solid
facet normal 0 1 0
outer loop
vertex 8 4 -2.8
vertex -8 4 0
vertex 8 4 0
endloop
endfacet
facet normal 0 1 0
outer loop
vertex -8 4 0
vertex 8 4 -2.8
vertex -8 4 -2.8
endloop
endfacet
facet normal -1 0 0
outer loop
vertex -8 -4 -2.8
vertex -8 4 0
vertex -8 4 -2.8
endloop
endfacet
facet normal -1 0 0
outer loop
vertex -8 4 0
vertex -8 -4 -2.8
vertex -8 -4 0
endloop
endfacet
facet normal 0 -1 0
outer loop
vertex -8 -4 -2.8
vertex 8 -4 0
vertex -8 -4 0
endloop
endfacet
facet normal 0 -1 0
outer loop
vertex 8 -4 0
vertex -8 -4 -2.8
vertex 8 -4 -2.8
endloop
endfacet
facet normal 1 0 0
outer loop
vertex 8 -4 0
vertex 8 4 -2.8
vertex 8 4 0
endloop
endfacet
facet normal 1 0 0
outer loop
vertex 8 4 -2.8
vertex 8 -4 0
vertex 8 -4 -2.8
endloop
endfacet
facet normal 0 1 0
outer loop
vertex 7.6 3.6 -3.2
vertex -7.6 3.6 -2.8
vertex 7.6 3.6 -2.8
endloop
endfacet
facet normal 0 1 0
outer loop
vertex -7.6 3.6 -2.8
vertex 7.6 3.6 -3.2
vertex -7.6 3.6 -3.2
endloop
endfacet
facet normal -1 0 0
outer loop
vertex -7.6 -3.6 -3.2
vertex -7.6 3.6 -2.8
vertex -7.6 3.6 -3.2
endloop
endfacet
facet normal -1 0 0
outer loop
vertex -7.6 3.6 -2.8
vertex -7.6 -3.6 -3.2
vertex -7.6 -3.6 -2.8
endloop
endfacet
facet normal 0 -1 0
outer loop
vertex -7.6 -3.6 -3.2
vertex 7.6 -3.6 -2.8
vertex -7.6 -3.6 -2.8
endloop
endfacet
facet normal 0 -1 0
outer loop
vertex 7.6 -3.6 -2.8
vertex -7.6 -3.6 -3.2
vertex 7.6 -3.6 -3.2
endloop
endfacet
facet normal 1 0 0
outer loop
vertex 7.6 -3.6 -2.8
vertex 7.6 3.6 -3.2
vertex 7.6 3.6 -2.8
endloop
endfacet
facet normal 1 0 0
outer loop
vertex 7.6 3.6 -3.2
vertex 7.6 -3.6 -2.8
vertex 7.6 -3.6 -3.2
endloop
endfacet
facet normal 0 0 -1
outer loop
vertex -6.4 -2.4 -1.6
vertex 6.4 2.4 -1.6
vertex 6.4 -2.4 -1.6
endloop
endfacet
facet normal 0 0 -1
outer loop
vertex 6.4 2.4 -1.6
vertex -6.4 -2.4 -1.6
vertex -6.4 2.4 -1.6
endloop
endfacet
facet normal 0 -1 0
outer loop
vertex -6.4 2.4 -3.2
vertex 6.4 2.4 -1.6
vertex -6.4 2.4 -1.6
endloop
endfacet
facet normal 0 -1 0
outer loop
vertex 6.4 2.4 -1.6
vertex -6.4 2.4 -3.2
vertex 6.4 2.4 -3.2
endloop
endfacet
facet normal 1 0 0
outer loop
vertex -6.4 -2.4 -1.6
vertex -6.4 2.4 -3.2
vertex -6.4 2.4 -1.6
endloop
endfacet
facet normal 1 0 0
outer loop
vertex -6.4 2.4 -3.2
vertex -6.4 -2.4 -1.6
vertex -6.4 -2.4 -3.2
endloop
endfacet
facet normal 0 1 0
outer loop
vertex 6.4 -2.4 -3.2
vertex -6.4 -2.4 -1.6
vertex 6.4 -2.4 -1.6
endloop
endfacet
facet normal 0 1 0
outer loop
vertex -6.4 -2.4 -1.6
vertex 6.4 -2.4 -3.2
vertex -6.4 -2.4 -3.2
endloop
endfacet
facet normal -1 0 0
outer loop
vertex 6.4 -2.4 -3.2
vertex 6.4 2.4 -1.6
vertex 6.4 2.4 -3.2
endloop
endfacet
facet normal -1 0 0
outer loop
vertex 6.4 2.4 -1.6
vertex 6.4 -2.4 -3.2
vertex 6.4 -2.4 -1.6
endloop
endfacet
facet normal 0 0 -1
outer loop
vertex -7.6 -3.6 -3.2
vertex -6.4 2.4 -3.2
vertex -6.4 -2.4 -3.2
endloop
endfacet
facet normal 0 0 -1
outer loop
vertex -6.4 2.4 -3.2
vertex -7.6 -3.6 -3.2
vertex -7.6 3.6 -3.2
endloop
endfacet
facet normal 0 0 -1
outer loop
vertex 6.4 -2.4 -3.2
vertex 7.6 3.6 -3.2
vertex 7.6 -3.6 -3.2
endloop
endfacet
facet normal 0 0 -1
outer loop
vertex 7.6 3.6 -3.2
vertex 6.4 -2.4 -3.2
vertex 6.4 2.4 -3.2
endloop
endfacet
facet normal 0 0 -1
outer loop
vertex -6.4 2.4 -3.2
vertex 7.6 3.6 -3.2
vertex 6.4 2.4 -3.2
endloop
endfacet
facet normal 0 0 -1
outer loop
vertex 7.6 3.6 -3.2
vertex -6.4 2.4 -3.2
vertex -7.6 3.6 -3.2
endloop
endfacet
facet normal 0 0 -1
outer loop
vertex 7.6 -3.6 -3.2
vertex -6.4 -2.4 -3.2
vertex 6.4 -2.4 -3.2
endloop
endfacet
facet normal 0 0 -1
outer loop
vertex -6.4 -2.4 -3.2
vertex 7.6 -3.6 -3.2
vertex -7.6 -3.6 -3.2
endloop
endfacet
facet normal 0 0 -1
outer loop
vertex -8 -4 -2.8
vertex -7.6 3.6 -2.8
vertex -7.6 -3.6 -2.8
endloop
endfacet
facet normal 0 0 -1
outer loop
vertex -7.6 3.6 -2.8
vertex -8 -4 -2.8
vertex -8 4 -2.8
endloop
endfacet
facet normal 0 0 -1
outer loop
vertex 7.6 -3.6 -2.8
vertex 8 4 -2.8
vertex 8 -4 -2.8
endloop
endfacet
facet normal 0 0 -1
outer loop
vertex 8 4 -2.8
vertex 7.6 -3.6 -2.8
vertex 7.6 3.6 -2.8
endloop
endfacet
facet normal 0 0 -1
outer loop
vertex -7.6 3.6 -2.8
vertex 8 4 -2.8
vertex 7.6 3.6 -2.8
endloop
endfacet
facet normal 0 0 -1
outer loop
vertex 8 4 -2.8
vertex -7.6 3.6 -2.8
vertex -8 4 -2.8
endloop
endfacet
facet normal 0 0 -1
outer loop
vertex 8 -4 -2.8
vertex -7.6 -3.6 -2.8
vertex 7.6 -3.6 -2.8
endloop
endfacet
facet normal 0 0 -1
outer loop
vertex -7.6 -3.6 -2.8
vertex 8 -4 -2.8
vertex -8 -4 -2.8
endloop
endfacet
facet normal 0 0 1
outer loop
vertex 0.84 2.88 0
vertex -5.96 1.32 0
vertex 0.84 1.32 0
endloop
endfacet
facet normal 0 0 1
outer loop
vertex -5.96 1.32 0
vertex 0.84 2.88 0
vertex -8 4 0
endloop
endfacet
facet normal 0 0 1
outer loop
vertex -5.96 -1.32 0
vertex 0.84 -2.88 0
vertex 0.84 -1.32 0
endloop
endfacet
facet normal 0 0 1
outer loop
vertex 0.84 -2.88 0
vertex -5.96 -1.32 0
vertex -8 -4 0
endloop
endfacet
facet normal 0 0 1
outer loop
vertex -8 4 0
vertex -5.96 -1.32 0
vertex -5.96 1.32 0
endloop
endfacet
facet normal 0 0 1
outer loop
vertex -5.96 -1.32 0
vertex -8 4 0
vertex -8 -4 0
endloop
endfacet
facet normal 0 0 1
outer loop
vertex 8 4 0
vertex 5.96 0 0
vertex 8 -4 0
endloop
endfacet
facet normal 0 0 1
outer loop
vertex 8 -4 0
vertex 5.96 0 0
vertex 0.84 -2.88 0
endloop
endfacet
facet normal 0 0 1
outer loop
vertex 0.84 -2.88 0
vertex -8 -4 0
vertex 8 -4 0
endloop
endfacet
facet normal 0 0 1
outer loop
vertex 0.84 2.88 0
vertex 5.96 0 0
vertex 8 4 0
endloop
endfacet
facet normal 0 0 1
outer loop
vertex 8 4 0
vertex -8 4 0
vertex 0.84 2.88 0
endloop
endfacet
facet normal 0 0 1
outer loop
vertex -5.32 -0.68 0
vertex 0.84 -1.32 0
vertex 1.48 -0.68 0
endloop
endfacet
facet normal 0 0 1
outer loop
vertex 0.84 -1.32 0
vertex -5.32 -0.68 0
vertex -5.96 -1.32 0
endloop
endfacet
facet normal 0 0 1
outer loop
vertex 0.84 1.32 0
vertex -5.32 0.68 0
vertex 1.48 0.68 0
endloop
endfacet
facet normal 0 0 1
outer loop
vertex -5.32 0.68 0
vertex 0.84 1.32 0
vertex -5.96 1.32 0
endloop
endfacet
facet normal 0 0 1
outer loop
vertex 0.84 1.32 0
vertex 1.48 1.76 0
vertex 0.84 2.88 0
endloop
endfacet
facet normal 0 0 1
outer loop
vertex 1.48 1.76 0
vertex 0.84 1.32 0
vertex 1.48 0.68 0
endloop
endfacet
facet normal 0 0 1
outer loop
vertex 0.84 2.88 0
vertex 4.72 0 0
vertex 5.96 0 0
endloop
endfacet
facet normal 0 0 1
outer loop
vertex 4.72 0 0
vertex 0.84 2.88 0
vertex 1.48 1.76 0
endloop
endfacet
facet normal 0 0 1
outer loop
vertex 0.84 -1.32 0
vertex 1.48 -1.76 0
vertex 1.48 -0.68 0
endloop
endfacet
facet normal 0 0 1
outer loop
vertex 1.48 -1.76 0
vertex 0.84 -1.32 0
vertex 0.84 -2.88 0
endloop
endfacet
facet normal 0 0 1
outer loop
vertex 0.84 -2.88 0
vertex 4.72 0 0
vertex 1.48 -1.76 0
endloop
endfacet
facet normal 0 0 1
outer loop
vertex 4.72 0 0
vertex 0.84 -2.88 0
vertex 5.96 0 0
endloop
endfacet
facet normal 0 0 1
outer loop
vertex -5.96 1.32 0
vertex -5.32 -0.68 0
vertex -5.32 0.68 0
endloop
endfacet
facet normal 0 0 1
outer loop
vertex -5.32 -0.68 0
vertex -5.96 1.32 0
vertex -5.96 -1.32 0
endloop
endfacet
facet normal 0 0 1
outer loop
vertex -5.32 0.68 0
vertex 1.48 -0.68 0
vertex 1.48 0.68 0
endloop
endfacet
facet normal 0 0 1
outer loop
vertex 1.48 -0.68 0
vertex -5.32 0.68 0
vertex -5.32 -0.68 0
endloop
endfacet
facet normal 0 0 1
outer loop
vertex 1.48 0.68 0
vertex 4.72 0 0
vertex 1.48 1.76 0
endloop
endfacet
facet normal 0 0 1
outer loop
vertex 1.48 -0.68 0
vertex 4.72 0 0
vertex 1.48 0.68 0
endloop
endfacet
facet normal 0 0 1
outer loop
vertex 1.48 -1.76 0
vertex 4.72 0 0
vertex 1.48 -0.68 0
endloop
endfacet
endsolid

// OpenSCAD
// file: ../p/box5.scad
use <../lib.scad>
function ldraw_lib__box5() = [
// 0 Box with 5 Faces and All Edges
// 0 Name: box5.dat
// 0 Author: James Jessiman
// 0 !LDRAW_ORG Primitive UPDATE 2012-01
// 0 !LICENSE Licensed under CC BY 4.0 : see CAreadme.txt
// 
// 0 BFC CERTIFY CCW
  [0,"BFC","CERTIFY"],
  [0,"BFC","CCW"],
// 
// 0 !HISTORY 2002-04-03 [sbliss] Modified for BFC compliance
// 0 !HISTORY 2002-04-25 [PTadmin] Official Update 2002-02
// 0 !HISTORY 2007-06-24 [PTadmin] Header formatted for Contributor Agreement
// 0 !HISTORY 2008-07-01 [PTadmin] Official Update 2008-01
// 0 !HISTORY 2012-02-16 [Philo] Changed to CCW
// 0 !HISTORY 2012-03-30 [PTadmin] Official Update 2012-01
// 
// 
// 2 24 1 1 1 -1 1 1
  [2,24,1,1,1,-1,1,1],
// 2 24 -1 1 1 -1 1 -1
  [2,24,-1,1,1,-1,1,-1],
// 2 24 -1 1 -1 1 1 -1
  [2,24,-1,1,-1,1,1,-1],
// 2 24 1 1 -1 1 1 1
  [2,24,1,1,-1,1,1,1],
// 2 24 1 0 1 -1 0 1
  [2,24,1,0,1,-1,0,1],
// 2 24 -1 0 1 -1 0 -1
  [2,24,-1,0,1,-1,0,-1],
// 2 24 -1 0 -1 1 0 -1
  [2,24,-1,0,-1,1,0,-1],
// 2 24 1 0 -1 1 0 1
  [2,24,1,0,-1,1,0,1],
// 2 24 1 0 1 1 1 1
  [2,24,1,0,1,1,1,1],
// 2 24 -1 0 1 -1 1 1
  [2,24,-1,0,1,-1,1,1],
// 2 24 1 0 -1 1 1 -1
  [2,24,1,0,-1,1,1,-1],
// 2 24 -1 0 -1 -1 1 -1
  [2,24,-1,0,-1,-1,1,-1],
// 4 16 -1 1 1 1 1 1 1 1 -1 -1 1 -1
  [4,16,-1,1,1,1,1,1,1,1,-1,-1,1,-1],
// 4 16 -1 1 1 -1 0 1 1 0 1 1 1 1
  [4,16,-1,1,1,-1,0,1,1,0,1,1,1,1],
// 4 16 -1 1 -1 -1 0 -1 -1 0 1 -1 1 1
  [4,16,-1,1,-1,-1,0,-1,-1,0,1,-1,1,1],
// 4 16 1 1 -1 1 0 -1 -1 0 -1 -1 1 -1
  [4,16,1,1,-1,1,0,-1,-1,0,-1,-1,1,-1],
// 4 16 1 1 1 1 0 1 1 0 -1 1 1 -1
  [4,16,1,1,1,1,0,1,1,0,-1,1,1,-1],
];
module ldraw_lib__box5(step=0, col=false, unit=2/5, alt=false, line=0.2, solid=!$preview)
    makepoly(ldraw_lib__box5(), step=step, col=col, unit=unit, alt=alt, line=line, solid=solid);
ldraw_lib__box5(line=0.2);
// file: ../p/box4.scad
use <../lib.scad>
function ldraw_lib__box4() = [
// 0 Box with 4 Faces (2 Parallel Pairs) and All Edges
// 0 Name: box4.dat
// 0 Author: James Jessiman
// 0 !LDRAW_ORG Primitive UPDATE 2012-01
// 0 !LICENSE Licensed under CC BY 4.0 : see CAreadme.txt
// 
// 0 BFC CERTIFY CCW
  [0,"BFC","CERTIFY"],
  [0,"BFC","CCW"],
// 
// 0 !HISTORY 2002-04-03 [sbliss] Modified for BFC compliance
// 0 !HISTORY 2002-04-25 [PTadmin] Official Update 2002-02
// 0 !HISTORY 2007-06-24 [PTadmin] Header formatted for Contributor Agreement
// 0 !HISTORY 2008-07-01 [PTadmin] Official Update 2008-01
// 0 !HISTORY 2012-02-16 [Philo] Changed to CCW
// 0 !HISTORY 2012-03-30 [PTadmin] Official Update 2012-01
// 
// 
// 2 24 1 1 1 -1 1 1
  [2,24,1,1,1,-1,1,1],
// 2 24 -1 1 1 -1 1 -1
  [2,24,-1,1,1,-1,1,-1],
// 2 24 -1 1 -1 1 1 -1
  [2,24,-1,1,-1,1,1,-1],
// 2 24 1 1 -1 1 1 1
  [2,24,1,1,-1,1,1,1],
// 2 24 1 0 1 -1 0 1
  [2,24,1,0,1,-1,0,1],
// 2 24 -1 0 1 -1 0 -1
  [2,24,-1,0,1,-1,0,-1],
// 2 24 -1 0 -1 1 0 -1
  [2,24,-1,0,-1,1,0,-1],
// 2 24 1 0 -1 1 0 1
  [2,24,1,0,-1,1,0,1],
// 2 24 1 0 1 1 1 1
  [2,24,1,0,1,1,1,1],
// 2 24 -1 0 1 -1 1 1
  [2,24,-1,0,1,-1,1,1],
// 2 24 1 0 -1 1 1 -1
  [2,24,1,0,-1,1,1,-1],
// 2 24 -1 0 -1 -1 1 -1
  [2,24,-1,0,-1,-1,1,-1],
// 4 16 -1 1 1 -1 0 1 1 0 1 1 1 1
  [4,16,-1,1,1,-1,0,1,1,0,1,1,1,1],
// 4 16 -1 1 -1 -1 0 -1 -1 0 1 -1 1 1
  [4,16,-1,1,-1,-1,0,-1,-1,0,1,-1,1,1],
// 4 16 1 1 -1 1 0 -1 -1 0 -1 -1 1 -1
  [4,16,1,1,-1,1,0,-1,-1,0,-1,-1,1,-1],
// 4 16 1 1 1 1 0 1 1 0 -1 1 1 -1
  [4,16,1,1,1,1,0,1,1,0,-1,1,1,-1],
];
module ldraw_lib__box4(step=0, col=false, unit=2/5, alt=false, line=0.2, solid=!$preview)
    makepoly(ldraw_lib__box4(), step=step, col=col, unit=unit, alt=alt, line=line, solid=solid);
ldraw_lib__box4(line=0.2);
// file: s/3069p06c.scad
use <../../lib.scad>
function ldraw_lib__s__3069p06c() = [
// 0 ~Tile  1 x  2 with Arrow Long Pattern (Arrow)
// 0 Name: s\3069p06c.dat
// 0 Author: William Howard [WilliamH]
// 0 !LDRAW_ORG Subpart UPDATE 2009-03
// 0 !LICENSE Licensed under CC BY 2.0 and CC BY 4.0 : see CAreadme.txt
// 
// 0 BFC CERTIFY CCW
  [0,"BFC","CERTIFY"],
  [0,"BFC","CCW"],
// 
// 0 !HISTORY 2009-05-02 [PTadmin] Official Update 2009-01
// 0 !HISTORY 2009-08-18 [anathema] Improved pattern
// 0 !HISTORY 2009-12-29 [PTadmin] Official Update 2009-03
// 
// 
// 4 16 -13.3 0 -1.7 3.7 0 -1.7 3.7 0 1.7 -13.3 0 1.7
  [4,16,-13.3,0,-1.7,3.7,0,-1.7,3.7,0,1.7,-13.3,0,1.7],
// 3 16 3.7 0 1.7 11.8 0 0 3.7 0 4.4
  [3,16,3.7,0,1.7,11.8,0,0,3.7,0,4.4],
// 3 16 3.7 0 -1.7 11.8 0 0 3.7 0 1.7
  [3,16,3.7,0,-1.7,11.8,0,0,3.7,0,1.7],
// 3 16 3.7 0 -4.4 11.8 0 0 3.7 0 -1.7
  [3,16,3.7,0,-4.4,11.8,0,0,3.7,0,-1.7],
// 0
];
module ldraw_lib__s__3069p06c(step=0, col=false, unit=2/5, alt=false, line=0.2, solid=!$preview)
    makepoly(ldraw_lib__s__3069p06c(), step=step, col=col, unit=unit, alt=alt, line=line, solid=solid);
ldraw_lib__s__3069p06c(line=0.2);
// file: s/3069p06b.scad
use <../../lib.scad>
function ldraw_lib__s__3069p06b() = [
// 0 ~Tile  1 x  2 with Arrow Long Pattern (Border)
// 0 Name: s\3069p06b.dat
// 0 Author: William Howard [WilliamH]
// 0 !LDRAW_ORG Subpart UPDATE 2009-03
// 0 !LICENSE Licensed under CC BY 2.0 and CC BY 4.0 : see CAreadme.txt
// 
// 0 BFC CERTIFY CCW
  [0,"BFC","CERTIFY"],
  [0,"BFC","CCW"],
// 
// 0 !HISTORY 2009-05-02 [PTadmin] Official Update 2009-01
// 0 !HISTORY 2009-08-18 [anathema] Improved pattern
// 0 !HISTORY 2009-10-09 [cwdee] Corrected small overlap
// 0 !HISTORY 2009-12-29 [PTadmin] Official Update 2009-03
// 
// 
// 4 16 -14.9 0 -3.3 2.1 0 -3.3 3.7 0 -1.7 -13.3 0 -1.7
  [4,16,-14.9,0,-3.3,2.1,0,-3.3,3.7,0,-1.7,-13.3,0,-1.7],
// 4 16 -13.3 0 1.7 3.7 0 1.7 2.1 0 3.3 -14.9 0 3.3
  [4,16,-13.3,0,1.7,3.7,0,1.7,2.1,0,3.3,-14.9,0,3.3],
// 4 16 2.1 0 7.2 2.1 0 3.3 3.7 0 1.7 3.7 0 4.4
  [4,16,2.1,0,7.2,2.1,0,3.3,3.7,0,1.7,3.7,0,4.4],
// 4 16 3.7 0 4.4 11.8 0 0 14.9 0 0 2.1 0 7.2
  [4,16,3.7,0,4.4,11.8,0,0,14.9,0,0,2.1,0,7.2],
// 4 16 3.7 0 -4.4 3.7 0 -1.7 2.1 0 -3.3 2.1 0 -7.2
  [4,16,3.7,0,-4.4,3.7,0,-1.7,2.1,0,-3.3,2.1,0,-7.2],
// 4 16 2.1 0 -7.2 14.9 0 0 11.8 0 0 3.7 0 -4.4
  [4,16,2.1,0,-7.2,14.9,0,0,11.8,0,0,3.7,0,-4.4],
// 4 16 -14.9 0 3.3 -14.9 0 -3.3 -13.3 0 -1.7 -13.3 0 1.7
  [4,16,-14.9,0,3.3,-14.9,0,-3.3,-13.3,0,-1.7,-13.3,0,1.7],
// 0
];
module ldraw_lib__s__3069p06b(step=0, col=false, unit=2/5, alt=false, line=0.2, solid=!$preview)
    makepoly(ldraw_lib__s__3069p06b(), step=step, col=col, unit=unit, alt=alt, line=line, solid=solid);
ldraw_lib__s__3069p06b(line=0.2);
// file: s/3069p06a.scad
use <../../lib.scad>
function ldraw_lib__s__3069p06a() = [
// 0 ~Tile  1 x  2 with Arrow Long Pattern (Mask)
// 0 Name: s\3069p06a.dat
// 0 Author: William Howard [WilliamH]
// 0 !LDRAW_ORG Subpart UPDATE 2009-03
// 0 !LICENSE Licensed under CC BY 2.0 and CC BY 4.0 : see CAreadme.txt
// 
// 0 BFC CERTIFY CCW
  [0,"BFC","CERTIFY"],
  [0,"BFC","CCW"],
// 
// 0 !HISTORY 2009-05-02 [PTadmin] Official Update 2009-01
// 0 !HISTORY 2009-08-18 [anathema] Improved pattern
// 0 !HISTORY 2009-12-29 [PTadmin] Official Update 2009-03
// 
// 
// 4 16 -14.9 0 3.3 2.1 0 3.3 2.1 0 7.2 -20 0 10
  [4,16,-14.9,0,3.3,2.1,0,3.3,2.1,0,7.2,-20,0,10],
// 4 16 -20 0 -10 2.1 0 -7.2 2.1 0 -3.3 -14.9 0 -3.3
  [4,16,-20,0,-10,2.1,0,-7.2,2.1,0,-3.3,-14.9,0,-3.3],
// 4 16 -20 0 10 -20 0 -10 -14.9 0 -3.3 -14.9 0 3.3
  [4,16,-20,0,10,-20,0,-10,-14.9,0,-3.3,-14.9,0,3.3],
// 3 16 20 0 10 14.9 0 0 20 0 -10
  [3,16,20,0,10,14.9,0,0,20,0,-10],
// 3 16 20 0 -10 14.9 0 0 2.1 0 -7.2
  [3,16,20,0,-10,14.9,0,0,2.1,0,-7.2],
// 3 16 2.1 0 -7.2 -20 0 -10 20 0 -10
  [3,16,2.1,0,-7.2,-20,0,-10,20,0,-10],
// 3 16 2.1 0 7.2 14.9 0 0 20 0 10
  [3,16,2.1,0,7.2,14.9,0,0,20,0,10],
// 3 16 20 0 10 -20 0 10 2.1 0 7.2
  [3,16,20,0,10,-20,0,10,2.1,0,7.2],
// 0
];
module ldraw_lib__s__3069p06a(step=0, col=false, unit=2/5, alt=false, line=0.2, solid=!$preview)
    makepoly(ldraw_lib__s__3069p06a(), step=step, col=col, unit=unit, alt=alt, line=line, solid=solid);
ldraw_lib__s__3069p06a(line=0.2);
// file: s/3069bs01.scad
use <../../lib.scad>
use <../../p/box4.scad>
use <../../p/box5.scad>
function ldraw_lib__s__3069bs01() = [
// 0 ~Tile  1 x  2 with Groove without Top Face
// 0 Name: s\3069bs01.dat
// 0 Author: Santeri Piippo [arezey]
// 0 !LDRAW_ORG Subpart UPDATE 2010-02
// 0 !LICENSE Licensed under CC BY 4.0 : see CAreadme.txt
// 
// 0 BFC CERTIFY CCW
  [0,"BFC","CERTIFY"],
  [0,"BFC","CCW"],
// 
// 0 !HISTORY 2010-07-05 [PTadmin] Official Update 2010-02
// 
// 
// 1 16 0 0 0 20 0 0 0 7 0 0 0 10 box4.dat
  [1,16,0,0,0,20,0,0,0,7,0,0,0,10, ldraw_lib__box4()],
// 1 16 0 7 0 19 0 0 0 1 0 0 0 9 box4.dat
  [1,16,0,7,0,19,0,0,0,1,0,0,0,9, ldraw_lib__box4()],
// 0 BFC INVERTNEXT
  [0,"BFC","INVERTNEXT"],
// 1 16 0 8 0 16 0 0 0 -4 0 0 0 6 box5.dat
  [1,16,0,8,0,16,0,0,0,-4,0,0,0,6, ldraw_lib__box5()],
// 4 16 -19 8 9 -16 8 6 -16 8 -6 -19 8 -9
  [4,16,-19,8,9,-16,8,6,-16,8,-6,-19,8,-9],
// 4 16 19 8 -9 16 8 -6 16 8 6 19 8 9
  [4,16,19,8,-9,16,8,-6,16,8,6,19,8,9],
// 4 16 19 8 9 16 8 6 -16 8 6 -19 8 9
  [4,16,19,8,9,16,8,6,-16,8,6,-19,8,9],
// 4 16 -19 8 -9 -16 8 -6 16 8 -6 19 8 -9
  [4,16,-19,8,-9,-16,8,-6,16,8,-6,19,8,-9],
// 4 16 -20 7 10 -19 7 9 -19 7 -9 -20 7 -10
  [4,16,-20,7,10,-19,7,9,-19,7,-9,-20,7,-10],
// 4 16 20 7 -10 19 7 -9 19 7 9 20 7 10
  [4,16,20,7,-10,19,7,-9,19,7,9,20,7,10],
// 4 16 20 7 10 19 7 9 -19 7 9 -20 7 10
  [4,16,20,7,10,19,7,9,-19,7,9,-20,7,10],
// 4 16 -20 7 -10 -19 7 -9 19 7 -9 20 7 -10
  [4,16,-20,7,-10,-19,7,-9,19,7,-9,20,7,-10],
// 0 //
];
module ldraw_lib__s__3069bs01(step=0, col=false, unit=2/5, alt=false, line=0.2, solid=!$preview)
    makepoly(ldraw_lib__s__3069bs01(), step=step, col=col, unit=unit, alt=alt, line=line, solid=solid);
ldraw_lib__s__3069bs01(line=0.2);
// main file
use <../lib.scad>
use <s/3069bs01.scad>
use <s/3069p06a.scad>
use <s/3069p06b.scad>
use <s/3069p06c.scad>
function ldraw_lib__3069bp14() = [
// 0 Tile  1 x  2 with Arrow Long Yellow without Border Pattern
// 0 Name: 3069bp14.dat
// 0 Author: Alex Taylor [anathema]
// 0 !LDRAW_ORG Part UPDATE 2009-03
// 0 !LICENSE Licensed under CC BY 4.0 : see CAreadme.txt
// 
// 0 BFC CERTIFY CCW
  [0,"BFC","CERTIFY"],
  [0,"BFC","CCW"],
// 
// 0 !KEYWORDS BrickLink 3069pb0017, Rebrickable 3069bpr9981, set 2126
// 
// 0 !HISTORY 2009-12-29 [PTadmin] Official Update 2009-03
// 
// 
// 1 16 0 0 0 1 0 0 0 1 0 0 0 1 s\3069bs01.dat
  [1,16,0,0,0,1,0,0,0,1,0,0,0,1, ldraw_lib__s__3069bs01()],
// 1 16 0 0 0 1 0 0 0 1 0 0 0 1 s\3069p06a.dat
  [1,16,0,0,0,1,0,0,0,1,0,0,0,1, ldraw_lib__s__3069p06a()],
// 1 14 0 0 0 1 0 0 0 1 0 0 0 1 s\3069p06b.dat
  [1,14,0,0,0,1,0,0,0,1,0,0,0,1, ldraw_lib__s__3069p06b()],
// 1 14 0 0 0 1 0 0 0 1 0 0 0 1 s\3069p06c.dat
  [1,14,0,0,0,1,0,0,0,1,0,0,0,1, ldraw_lib__s__3069p06c()],
// 0
];
module ldraw_lib__3069bp14(step=0, col=false, unit=2/5, alt=false, line=0.2, solid=!$preview)
    makepoly(ldraw_lib__3069bp14(), step=step, col=col, unit=unit, alt=alt, line=line, solid=solid);
ldraw_lib__3069bp14(line=0.2);
